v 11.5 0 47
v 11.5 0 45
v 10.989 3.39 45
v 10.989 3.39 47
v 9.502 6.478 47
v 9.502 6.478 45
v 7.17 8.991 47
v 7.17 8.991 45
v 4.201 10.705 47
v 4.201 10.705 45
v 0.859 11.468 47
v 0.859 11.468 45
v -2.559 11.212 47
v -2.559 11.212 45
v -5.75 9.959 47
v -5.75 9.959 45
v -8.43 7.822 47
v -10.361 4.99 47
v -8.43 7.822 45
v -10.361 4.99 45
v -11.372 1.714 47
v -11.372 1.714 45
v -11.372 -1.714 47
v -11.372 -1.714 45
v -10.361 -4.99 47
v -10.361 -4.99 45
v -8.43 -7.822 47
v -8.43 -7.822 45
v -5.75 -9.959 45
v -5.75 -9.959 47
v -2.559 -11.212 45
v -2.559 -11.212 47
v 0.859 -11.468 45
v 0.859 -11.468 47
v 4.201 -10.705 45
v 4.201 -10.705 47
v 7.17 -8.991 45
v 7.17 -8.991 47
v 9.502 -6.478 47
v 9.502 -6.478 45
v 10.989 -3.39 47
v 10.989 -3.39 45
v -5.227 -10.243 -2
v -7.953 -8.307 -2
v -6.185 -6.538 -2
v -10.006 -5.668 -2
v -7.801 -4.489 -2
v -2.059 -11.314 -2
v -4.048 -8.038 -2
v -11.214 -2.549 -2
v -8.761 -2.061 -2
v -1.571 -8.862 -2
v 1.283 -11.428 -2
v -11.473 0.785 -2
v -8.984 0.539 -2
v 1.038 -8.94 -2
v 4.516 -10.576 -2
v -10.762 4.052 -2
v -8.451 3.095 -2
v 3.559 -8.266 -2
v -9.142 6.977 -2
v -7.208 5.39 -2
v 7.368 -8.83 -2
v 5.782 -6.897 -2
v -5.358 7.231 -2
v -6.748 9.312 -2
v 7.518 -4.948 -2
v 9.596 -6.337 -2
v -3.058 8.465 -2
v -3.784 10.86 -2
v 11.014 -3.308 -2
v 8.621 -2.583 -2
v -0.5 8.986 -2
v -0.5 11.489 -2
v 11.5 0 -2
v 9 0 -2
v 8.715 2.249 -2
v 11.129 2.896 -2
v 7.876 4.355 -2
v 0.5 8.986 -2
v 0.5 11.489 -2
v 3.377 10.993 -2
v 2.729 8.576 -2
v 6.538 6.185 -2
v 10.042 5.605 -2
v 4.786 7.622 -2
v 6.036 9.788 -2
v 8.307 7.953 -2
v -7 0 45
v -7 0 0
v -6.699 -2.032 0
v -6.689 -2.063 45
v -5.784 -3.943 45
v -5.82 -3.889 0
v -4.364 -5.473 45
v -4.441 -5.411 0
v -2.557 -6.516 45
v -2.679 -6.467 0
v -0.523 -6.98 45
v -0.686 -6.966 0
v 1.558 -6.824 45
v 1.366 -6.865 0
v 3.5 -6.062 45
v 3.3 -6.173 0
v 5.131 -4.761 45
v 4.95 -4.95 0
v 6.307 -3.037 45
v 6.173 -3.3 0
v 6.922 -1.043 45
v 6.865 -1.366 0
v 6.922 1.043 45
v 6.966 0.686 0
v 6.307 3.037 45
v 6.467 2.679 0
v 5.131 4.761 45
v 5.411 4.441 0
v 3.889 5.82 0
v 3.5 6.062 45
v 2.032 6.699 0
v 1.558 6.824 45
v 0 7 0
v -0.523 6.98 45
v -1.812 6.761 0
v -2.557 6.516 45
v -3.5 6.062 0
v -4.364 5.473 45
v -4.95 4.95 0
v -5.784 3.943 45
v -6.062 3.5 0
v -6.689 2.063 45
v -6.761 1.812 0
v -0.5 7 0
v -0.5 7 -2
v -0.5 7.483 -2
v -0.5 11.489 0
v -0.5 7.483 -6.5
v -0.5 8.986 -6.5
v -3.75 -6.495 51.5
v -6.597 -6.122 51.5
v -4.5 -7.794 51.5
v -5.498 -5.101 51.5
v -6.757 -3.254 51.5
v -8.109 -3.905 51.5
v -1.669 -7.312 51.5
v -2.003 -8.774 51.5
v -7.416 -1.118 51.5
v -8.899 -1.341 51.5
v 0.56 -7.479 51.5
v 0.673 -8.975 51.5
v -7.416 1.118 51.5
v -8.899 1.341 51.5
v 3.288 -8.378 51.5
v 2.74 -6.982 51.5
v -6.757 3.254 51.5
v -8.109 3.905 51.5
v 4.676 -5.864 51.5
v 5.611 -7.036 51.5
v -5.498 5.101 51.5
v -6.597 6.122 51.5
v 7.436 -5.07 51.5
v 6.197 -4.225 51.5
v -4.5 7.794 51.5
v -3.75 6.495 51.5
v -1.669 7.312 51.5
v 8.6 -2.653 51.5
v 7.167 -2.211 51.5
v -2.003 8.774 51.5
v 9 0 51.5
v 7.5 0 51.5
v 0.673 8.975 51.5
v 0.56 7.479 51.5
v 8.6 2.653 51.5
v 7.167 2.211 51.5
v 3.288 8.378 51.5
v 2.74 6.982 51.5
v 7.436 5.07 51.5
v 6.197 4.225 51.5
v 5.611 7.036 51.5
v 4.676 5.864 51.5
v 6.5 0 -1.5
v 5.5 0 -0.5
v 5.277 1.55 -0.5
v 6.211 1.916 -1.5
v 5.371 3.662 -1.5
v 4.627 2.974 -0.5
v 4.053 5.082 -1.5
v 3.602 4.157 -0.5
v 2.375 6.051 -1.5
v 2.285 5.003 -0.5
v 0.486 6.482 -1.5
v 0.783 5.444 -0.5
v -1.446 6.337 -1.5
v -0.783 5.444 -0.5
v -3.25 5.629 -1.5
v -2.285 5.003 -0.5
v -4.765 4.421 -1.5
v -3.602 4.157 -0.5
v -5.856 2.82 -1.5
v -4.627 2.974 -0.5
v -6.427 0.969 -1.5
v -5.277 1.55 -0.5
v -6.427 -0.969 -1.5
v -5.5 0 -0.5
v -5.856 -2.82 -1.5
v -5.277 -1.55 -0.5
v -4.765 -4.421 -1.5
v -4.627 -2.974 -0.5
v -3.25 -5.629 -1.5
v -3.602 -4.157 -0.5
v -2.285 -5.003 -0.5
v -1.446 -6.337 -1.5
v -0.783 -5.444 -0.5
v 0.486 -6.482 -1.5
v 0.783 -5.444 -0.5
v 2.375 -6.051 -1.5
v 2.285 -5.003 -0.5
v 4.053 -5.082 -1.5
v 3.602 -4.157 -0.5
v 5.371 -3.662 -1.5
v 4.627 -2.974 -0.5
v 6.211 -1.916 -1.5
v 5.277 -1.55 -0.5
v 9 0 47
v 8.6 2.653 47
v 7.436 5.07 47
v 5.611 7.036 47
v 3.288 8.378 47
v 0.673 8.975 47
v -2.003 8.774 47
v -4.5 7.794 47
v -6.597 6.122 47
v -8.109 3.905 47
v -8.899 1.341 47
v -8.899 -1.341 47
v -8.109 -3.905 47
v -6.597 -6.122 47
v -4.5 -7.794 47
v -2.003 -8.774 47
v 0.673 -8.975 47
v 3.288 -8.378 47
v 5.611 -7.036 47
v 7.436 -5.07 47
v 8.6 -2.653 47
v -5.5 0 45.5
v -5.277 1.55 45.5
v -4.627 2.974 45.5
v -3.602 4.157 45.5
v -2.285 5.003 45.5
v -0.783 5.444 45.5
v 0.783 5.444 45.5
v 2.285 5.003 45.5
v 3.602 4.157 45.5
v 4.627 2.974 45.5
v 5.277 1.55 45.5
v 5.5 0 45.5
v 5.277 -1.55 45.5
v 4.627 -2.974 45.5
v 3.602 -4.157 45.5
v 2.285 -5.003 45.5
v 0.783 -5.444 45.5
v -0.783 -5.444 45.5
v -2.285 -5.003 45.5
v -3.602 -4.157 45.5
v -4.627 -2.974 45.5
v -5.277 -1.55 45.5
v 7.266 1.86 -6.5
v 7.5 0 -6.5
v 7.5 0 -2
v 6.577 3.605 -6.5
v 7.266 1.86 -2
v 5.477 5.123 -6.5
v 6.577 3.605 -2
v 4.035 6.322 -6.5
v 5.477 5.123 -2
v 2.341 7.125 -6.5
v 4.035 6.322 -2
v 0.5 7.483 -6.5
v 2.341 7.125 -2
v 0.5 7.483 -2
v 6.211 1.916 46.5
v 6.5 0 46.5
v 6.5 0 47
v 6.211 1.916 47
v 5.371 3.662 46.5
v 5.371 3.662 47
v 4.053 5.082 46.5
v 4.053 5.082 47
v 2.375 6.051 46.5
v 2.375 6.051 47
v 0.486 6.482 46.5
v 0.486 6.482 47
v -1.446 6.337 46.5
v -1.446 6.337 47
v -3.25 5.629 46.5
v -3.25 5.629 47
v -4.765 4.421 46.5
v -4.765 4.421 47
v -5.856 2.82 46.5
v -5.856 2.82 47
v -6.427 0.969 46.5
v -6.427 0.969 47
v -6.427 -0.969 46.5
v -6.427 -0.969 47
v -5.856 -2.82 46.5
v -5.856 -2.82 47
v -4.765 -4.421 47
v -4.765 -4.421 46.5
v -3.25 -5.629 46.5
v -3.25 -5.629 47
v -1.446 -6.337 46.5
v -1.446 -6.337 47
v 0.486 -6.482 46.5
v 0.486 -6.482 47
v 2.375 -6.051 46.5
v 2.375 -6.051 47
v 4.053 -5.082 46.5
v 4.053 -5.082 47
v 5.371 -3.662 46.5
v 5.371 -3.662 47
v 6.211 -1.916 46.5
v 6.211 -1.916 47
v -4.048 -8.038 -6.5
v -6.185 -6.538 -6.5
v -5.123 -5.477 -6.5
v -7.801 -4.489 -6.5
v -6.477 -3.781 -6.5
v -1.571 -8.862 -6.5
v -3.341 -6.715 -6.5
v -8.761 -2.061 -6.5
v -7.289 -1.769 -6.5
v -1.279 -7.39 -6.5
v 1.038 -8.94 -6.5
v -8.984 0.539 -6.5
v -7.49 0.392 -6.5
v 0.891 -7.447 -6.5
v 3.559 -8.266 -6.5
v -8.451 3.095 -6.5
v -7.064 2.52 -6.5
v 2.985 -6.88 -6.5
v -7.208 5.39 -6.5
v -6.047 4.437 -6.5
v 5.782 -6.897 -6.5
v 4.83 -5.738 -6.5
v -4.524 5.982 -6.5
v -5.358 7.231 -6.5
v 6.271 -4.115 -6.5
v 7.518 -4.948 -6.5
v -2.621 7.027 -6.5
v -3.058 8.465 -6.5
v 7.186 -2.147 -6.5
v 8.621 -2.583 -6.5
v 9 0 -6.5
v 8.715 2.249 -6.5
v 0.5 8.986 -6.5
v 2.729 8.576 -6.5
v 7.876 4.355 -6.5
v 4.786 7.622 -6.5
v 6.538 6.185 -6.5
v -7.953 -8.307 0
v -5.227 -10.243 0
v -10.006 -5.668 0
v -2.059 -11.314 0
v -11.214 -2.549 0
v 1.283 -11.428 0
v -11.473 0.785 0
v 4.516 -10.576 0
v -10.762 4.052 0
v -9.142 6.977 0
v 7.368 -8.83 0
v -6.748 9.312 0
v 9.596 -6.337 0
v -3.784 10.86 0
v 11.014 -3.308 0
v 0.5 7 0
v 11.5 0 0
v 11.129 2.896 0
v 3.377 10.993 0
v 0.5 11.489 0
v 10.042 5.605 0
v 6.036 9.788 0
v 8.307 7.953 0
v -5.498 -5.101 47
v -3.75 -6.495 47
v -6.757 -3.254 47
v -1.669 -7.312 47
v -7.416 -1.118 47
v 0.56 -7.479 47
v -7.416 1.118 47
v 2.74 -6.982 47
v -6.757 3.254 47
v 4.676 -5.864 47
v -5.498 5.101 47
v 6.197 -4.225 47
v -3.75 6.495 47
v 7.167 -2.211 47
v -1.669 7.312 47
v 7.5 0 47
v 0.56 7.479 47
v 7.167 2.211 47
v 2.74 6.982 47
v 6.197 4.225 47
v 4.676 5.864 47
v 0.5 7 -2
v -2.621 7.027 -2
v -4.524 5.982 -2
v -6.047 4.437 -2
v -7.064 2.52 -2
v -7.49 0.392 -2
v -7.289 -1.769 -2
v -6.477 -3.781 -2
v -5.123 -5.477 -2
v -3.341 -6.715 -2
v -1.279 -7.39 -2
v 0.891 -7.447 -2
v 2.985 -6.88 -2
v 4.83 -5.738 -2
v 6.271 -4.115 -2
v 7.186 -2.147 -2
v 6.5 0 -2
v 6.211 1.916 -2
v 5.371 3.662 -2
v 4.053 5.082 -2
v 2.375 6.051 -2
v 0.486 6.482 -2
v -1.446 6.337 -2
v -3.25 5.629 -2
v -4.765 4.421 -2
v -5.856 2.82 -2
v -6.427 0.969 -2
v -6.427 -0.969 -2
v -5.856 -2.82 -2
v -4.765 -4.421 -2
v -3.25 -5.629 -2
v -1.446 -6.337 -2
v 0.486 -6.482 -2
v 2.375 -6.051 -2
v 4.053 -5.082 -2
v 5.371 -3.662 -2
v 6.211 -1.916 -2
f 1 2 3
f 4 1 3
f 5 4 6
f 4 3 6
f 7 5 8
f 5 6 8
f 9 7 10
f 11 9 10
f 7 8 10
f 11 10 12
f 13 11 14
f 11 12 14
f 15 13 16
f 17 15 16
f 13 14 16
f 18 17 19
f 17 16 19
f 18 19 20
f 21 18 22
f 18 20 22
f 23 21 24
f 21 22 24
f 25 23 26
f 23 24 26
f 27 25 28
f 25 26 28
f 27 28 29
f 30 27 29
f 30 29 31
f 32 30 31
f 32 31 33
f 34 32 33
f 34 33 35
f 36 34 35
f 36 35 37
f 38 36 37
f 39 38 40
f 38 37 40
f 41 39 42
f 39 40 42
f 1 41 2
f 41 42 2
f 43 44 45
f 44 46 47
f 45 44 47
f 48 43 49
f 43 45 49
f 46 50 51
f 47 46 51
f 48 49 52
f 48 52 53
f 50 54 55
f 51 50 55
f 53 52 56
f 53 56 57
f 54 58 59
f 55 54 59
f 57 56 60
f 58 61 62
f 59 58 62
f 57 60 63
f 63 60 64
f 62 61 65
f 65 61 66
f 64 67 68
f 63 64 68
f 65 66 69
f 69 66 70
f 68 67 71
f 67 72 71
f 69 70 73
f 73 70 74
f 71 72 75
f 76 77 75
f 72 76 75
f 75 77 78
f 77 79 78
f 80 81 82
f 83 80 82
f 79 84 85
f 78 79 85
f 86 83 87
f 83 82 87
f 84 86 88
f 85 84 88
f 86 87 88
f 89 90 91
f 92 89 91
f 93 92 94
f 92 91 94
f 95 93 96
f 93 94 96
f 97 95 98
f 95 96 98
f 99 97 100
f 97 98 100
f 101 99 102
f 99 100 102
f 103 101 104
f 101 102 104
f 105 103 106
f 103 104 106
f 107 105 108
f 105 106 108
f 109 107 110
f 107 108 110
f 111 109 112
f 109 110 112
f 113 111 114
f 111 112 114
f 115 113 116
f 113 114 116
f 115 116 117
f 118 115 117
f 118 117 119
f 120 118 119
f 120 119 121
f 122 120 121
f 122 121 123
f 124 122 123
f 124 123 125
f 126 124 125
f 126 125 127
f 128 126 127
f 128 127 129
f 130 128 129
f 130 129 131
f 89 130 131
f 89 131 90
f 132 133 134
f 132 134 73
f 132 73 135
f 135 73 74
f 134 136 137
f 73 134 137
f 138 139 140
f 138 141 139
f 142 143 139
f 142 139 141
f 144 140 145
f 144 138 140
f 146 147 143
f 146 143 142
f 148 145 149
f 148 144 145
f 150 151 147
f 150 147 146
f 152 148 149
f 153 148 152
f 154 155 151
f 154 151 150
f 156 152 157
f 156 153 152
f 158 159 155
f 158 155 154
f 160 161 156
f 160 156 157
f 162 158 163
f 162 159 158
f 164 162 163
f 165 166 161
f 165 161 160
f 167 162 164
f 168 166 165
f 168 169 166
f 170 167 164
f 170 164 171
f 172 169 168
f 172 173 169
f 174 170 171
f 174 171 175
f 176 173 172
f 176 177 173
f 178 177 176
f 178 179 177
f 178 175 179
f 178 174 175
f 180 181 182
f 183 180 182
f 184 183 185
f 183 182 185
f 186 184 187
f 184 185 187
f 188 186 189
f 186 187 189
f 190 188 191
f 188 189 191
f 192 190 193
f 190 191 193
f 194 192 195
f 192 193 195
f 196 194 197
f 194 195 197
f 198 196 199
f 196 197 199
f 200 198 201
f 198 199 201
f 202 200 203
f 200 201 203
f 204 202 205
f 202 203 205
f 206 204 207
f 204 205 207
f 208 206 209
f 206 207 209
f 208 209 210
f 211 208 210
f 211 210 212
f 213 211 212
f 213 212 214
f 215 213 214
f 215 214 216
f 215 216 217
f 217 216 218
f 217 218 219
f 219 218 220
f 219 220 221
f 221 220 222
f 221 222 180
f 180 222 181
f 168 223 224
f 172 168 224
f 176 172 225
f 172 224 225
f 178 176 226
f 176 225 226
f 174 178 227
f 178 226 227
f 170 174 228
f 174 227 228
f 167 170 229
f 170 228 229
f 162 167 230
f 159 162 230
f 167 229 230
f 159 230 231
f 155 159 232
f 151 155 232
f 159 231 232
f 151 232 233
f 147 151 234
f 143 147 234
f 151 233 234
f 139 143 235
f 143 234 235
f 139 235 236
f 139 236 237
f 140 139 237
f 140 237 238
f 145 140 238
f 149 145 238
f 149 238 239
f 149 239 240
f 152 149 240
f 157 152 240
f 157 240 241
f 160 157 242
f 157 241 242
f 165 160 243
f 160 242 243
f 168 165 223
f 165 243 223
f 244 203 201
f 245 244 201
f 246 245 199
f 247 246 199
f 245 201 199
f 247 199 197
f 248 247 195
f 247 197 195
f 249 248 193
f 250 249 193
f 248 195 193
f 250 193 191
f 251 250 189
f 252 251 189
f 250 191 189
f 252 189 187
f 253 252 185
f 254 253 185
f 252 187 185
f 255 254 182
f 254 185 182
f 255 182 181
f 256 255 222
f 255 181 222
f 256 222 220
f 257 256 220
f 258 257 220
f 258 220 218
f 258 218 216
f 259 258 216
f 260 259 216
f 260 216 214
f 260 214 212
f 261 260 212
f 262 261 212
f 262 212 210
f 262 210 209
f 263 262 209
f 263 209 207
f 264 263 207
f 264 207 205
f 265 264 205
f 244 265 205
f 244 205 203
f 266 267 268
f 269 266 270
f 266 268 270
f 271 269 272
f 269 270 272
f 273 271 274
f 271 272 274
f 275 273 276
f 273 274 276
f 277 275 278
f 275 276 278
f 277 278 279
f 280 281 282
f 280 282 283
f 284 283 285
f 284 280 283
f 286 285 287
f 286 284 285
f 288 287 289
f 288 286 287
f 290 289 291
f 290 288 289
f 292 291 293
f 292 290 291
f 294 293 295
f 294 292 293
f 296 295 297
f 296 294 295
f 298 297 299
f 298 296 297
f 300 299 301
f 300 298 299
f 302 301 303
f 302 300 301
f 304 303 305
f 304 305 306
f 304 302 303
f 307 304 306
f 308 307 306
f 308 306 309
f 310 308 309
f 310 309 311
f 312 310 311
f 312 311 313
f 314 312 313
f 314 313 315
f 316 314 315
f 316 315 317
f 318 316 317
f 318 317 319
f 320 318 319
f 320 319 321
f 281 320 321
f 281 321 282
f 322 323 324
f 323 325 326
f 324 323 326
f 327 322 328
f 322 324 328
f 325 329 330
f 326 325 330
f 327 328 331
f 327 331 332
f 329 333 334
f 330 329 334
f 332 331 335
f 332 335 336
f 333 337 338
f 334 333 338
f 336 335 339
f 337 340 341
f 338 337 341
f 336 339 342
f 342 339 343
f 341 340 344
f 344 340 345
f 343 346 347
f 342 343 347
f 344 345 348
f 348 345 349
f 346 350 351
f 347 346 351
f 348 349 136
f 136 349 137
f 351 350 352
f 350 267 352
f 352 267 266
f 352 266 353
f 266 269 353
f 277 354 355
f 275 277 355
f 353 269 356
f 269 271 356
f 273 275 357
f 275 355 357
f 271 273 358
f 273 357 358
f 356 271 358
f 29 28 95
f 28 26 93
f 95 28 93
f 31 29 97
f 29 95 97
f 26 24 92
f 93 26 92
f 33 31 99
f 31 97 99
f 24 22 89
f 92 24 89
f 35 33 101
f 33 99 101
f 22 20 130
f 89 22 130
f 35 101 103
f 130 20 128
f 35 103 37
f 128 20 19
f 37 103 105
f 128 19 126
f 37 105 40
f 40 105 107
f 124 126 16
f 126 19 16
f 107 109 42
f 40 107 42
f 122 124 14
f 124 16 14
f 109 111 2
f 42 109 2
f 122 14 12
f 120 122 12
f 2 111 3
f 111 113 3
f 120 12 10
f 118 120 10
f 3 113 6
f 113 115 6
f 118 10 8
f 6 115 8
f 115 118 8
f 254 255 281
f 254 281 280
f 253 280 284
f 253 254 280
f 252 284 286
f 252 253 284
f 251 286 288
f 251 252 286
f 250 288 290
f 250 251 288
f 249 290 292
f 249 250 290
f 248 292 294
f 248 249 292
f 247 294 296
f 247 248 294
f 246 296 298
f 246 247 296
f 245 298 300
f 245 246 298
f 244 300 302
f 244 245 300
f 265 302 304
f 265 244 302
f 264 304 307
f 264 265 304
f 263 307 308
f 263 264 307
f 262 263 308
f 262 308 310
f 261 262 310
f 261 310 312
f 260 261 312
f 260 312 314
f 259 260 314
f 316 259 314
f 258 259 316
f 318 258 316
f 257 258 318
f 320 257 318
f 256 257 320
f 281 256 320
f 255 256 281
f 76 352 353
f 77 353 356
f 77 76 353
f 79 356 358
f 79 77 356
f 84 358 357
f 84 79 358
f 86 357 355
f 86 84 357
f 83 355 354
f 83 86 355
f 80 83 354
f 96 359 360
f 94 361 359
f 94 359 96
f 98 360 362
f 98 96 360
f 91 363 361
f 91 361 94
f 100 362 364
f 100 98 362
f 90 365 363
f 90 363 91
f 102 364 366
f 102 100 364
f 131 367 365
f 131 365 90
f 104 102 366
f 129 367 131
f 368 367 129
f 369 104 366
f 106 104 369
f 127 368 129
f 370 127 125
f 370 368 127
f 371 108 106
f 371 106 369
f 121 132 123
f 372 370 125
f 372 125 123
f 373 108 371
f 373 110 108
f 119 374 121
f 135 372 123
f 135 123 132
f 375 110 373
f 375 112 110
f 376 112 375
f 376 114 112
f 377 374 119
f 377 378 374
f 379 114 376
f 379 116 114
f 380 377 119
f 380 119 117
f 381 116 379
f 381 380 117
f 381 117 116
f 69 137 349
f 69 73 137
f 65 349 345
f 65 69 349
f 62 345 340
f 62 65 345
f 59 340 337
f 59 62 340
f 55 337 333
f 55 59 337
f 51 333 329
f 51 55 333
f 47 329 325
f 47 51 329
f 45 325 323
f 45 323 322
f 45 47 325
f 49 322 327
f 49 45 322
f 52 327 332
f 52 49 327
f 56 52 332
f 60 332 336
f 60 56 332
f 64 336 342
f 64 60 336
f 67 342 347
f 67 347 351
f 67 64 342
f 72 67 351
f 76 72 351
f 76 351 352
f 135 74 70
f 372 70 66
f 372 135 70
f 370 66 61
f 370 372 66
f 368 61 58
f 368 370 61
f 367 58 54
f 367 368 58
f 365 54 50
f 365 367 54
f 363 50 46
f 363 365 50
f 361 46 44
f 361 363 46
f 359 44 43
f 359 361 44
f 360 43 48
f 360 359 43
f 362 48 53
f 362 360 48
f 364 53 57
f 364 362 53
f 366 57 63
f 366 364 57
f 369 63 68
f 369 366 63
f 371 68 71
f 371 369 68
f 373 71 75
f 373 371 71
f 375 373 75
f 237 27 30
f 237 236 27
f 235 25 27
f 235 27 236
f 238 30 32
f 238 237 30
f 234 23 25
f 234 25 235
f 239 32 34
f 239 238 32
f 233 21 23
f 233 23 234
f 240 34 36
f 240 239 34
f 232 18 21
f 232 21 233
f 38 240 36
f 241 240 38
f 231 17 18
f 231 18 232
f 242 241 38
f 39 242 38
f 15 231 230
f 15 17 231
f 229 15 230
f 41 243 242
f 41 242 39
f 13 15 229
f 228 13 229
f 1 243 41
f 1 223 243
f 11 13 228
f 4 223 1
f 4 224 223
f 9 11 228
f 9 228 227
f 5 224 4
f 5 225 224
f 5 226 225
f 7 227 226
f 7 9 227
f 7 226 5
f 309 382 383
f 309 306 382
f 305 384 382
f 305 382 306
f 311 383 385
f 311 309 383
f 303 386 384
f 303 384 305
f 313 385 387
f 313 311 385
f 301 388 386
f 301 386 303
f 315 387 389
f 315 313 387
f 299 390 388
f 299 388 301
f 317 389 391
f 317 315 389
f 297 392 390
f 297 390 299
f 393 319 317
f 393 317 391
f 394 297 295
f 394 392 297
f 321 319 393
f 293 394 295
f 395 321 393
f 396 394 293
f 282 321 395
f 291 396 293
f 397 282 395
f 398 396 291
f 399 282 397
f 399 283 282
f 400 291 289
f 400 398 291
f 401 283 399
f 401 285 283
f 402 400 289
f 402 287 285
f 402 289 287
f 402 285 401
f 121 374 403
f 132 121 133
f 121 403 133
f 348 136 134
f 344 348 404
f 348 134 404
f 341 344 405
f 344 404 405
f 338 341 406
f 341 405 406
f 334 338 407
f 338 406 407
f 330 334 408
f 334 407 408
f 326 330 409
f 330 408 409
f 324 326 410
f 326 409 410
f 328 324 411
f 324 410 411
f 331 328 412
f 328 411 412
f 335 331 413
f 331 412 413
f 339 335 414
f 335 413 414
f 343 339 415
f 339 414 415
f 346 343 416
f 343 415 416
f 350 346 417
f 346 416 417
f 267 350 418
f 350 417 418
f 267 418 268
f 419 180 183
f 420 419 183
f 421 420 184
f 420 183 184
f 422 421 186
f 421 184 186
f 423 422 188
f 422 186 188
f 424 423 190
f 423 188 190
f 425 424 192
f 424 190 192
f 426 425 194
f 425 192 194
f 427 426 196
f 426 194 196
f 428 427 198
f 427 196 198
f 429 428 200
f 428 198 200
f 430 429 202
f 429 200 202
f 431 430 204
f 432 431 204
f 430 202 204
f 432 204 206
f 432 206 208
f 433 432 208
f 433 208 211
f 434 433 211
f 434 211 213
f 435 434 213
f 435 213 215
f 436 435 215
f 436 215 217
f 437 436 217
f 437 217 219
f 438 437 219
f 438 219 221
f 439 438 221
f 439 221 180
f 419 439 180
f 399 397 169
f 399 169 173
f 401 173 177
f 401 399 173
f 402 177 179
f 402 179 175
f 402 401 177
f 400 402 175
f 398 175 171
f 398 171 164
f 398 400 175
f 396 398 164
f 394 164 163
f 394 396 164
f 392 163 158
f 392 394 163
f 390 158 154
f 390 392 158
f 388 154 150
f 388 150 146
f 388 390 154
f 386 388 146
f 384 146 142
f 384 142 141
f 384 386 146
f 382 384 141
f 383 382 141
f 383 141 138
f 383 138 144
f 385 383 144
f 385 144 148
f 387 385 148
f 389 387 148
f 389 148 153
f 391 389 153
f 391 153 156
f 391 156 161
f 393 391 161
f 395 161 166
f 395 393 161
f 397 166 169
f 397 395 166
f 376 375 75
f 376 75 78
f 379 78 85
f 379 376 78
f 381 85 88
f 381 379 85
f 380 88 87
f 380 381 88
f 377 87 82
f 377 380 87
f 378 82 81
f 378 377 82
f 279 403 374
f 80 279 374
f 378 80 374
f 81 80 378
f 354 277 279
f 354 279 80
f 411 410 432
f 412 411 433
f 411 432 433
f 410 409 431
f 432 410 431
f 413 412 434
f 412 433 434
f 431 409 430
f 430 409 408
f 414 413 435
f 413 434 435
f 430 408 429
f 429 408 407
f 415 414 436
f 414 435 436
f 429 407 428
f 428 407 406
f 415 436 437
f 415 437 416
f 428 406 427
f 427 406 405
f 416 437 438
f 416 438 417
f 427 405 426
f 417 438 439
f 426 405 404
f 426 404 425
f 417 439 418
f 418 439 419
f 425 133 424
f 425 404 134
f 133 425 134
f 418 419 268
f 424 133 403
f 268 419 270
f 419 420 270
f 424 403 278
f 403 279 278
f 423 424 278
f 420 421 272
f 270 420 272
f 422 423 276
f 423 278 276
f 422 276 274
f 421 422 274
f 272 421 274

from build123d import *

# Parameters (mm, degrees)
SKETCH_1_R          = 7
SKETCH_1_R_2        = 5.5
EXTRUDE_1_DEPTH     = 45
SKETCH_2_R          = 11.5
SKETCH_2_R_2        = 6.5
EXTRUDE_2_DEPTH     = 2
SKETCH_3_R          = 9
SKETCH_3_R_2        = 7.5
EXTRUDE_3_DEPTH     = 4.5
CHAMFER_1_SIZE      = 1.5
CUT_EXTRUDE_1_REACH = 62.237
SKETCH_5_W          = 1
SKETCH_5_H          = 5.956385966


with BuildPart() as part:
    # 草图1 → 凸台-拉伸1 (new body)
    with BuildSketch(Plane.XY):
        with Locations(Location((0, 0, 0), (0, 0, 180))):
            Circle(SKETCH_1_R)
        with Locations(Location((0, 0, 0), (0, 0, 180))):
            Circle(SKETCH_1_R_2, mode=Mode.SUBTRACT)
    extrude(amount=EXTRUDE_1_DEPTH)

    # 草图2 → 凸台-拉伸2 (add)
    with BuildSketch(Plane.XY.offset(45)):
        Circle(SKETCH_2_R)
        Circle(SKETCH_2_R_2, mode=Mode.SUBTRACT)
    extrude_2 = extrude(amount=EXTRUDE_2_DEPTH)

    # 草图3 → 凸台-拉伸3 (add)
    with BuildSketch(Plane.XY.offset(47)):
        Circle(SKETCH_3_R)
        Circle(SKETCH_3_R_2, mode=Mode.SUBTRACT)
    extrude_3 = extrude(amount=EXTRUDE_3_DEPTH)

    # 镜向16: 凸台-拉伸2, 凸台-拉伸3 across plane
    add(extrude_2.mirror(Plane(origin=(0, 0, 22.5), x_dir=(1, 0, 0), z_dir=(0, 0, -1))))
    add(extrude_3.mirror(Plane(origin=(0, 0, 22.5), x_dir=(1, 0, 0), z_dir=(0, 0, -1))))

    # 倒角1
    # the kernel refuses this chamfer: 1.5 mm, written as the material it adds along each edge
    with BuildSketch(Plane(origin=(0, 0, 45), x_dir=(1, 0, 0), z_dir=(0, -1, 0))) as chamfer_1_piece_1_section:
        Polygon((6.5, CHAMFER_1_SIZE), (6.5 - CHAMFER_1_SIZE, 0), (6.5, 0), align=None)
    chamfer_1_piece_1 = revolve(axis=Axis((0, 0, 45), (0, 0, 1)), mode=Mode.PRIVATE)
    chamfer_1_piece_1 = chamfer_1_piece_1 - Plane(origin=(0, 0, 45.996711571), x_dir=(-1, 0, 0), z_dir=(0, 0, -1)) * Cylinder(5.5, 26, mode=Mode.PRIVATE)
    add(chamfer_1_piece_1)
    with BuildSketch(Plane(origin=(0, 0, 0), x_dir=(1, 0, 0), z_dir=(0, -1, 0))) as chamfer_1_piece_2_section:
        Polygon((6.5, -CHAMFER_1_SIZE), (6.5 - CHAMFER_1_SIZE, 0), (6.5, 0), align=None)
    chamfer_1_piece_2 = revolve(axis=Axis((0, 0, 0), (0, 0, 1)), mode=Mode.PRIVATE)
    chamfer_1_piece_2 = chamfer_1_piece_2 - Plane(origin=(0, 0, -0.996711571), x_dir=(-1, 0, 0), z_dir=(0, 0, -1)) * Cylinder(5.5, 26, mode=Mode.PRIVATE)
    add(chamfer_1_piece_2)

    # 切除-拉伸1: up to this face of the body (flat: up to its plane)
    cut_extrude_1_end = Plane(part.part.faces().sort_by_distance((-11.174730881, 0, 0))[0])
    # 草图5 → 切除-拉伸1 (cut, up to the picked face)
    with BuildSketch(Plane(origin=(0, 0, -6.5), x_dir=(-1, 0, 0), z_dir=(0, 0, -1)), mode=Mode.PRIVATE) as cut_extrude_1_sk1:
        with Locations((0, 9.978192983)):
            Rectangle(SKETCH_5_W, SKETCH_5_H)
    cut_extrude_1_tool1 = split(extrude(cut_extrude_1_sk1.sketch, amount=-CUT_EXTRUDE_1_REACH, mode=Mode.PRIVATE), bisect_by=cut_extrude_1_end, keep=Keep.BOTH, mode=Mode.PRIVATE)
    add(cut_extrude_1_tool1.solids().sort_by(Axis((0, 9.978193, -6.5), (0, 0, 1)))[0], mode=Mode.SUBTRACT)


solid = part.part
